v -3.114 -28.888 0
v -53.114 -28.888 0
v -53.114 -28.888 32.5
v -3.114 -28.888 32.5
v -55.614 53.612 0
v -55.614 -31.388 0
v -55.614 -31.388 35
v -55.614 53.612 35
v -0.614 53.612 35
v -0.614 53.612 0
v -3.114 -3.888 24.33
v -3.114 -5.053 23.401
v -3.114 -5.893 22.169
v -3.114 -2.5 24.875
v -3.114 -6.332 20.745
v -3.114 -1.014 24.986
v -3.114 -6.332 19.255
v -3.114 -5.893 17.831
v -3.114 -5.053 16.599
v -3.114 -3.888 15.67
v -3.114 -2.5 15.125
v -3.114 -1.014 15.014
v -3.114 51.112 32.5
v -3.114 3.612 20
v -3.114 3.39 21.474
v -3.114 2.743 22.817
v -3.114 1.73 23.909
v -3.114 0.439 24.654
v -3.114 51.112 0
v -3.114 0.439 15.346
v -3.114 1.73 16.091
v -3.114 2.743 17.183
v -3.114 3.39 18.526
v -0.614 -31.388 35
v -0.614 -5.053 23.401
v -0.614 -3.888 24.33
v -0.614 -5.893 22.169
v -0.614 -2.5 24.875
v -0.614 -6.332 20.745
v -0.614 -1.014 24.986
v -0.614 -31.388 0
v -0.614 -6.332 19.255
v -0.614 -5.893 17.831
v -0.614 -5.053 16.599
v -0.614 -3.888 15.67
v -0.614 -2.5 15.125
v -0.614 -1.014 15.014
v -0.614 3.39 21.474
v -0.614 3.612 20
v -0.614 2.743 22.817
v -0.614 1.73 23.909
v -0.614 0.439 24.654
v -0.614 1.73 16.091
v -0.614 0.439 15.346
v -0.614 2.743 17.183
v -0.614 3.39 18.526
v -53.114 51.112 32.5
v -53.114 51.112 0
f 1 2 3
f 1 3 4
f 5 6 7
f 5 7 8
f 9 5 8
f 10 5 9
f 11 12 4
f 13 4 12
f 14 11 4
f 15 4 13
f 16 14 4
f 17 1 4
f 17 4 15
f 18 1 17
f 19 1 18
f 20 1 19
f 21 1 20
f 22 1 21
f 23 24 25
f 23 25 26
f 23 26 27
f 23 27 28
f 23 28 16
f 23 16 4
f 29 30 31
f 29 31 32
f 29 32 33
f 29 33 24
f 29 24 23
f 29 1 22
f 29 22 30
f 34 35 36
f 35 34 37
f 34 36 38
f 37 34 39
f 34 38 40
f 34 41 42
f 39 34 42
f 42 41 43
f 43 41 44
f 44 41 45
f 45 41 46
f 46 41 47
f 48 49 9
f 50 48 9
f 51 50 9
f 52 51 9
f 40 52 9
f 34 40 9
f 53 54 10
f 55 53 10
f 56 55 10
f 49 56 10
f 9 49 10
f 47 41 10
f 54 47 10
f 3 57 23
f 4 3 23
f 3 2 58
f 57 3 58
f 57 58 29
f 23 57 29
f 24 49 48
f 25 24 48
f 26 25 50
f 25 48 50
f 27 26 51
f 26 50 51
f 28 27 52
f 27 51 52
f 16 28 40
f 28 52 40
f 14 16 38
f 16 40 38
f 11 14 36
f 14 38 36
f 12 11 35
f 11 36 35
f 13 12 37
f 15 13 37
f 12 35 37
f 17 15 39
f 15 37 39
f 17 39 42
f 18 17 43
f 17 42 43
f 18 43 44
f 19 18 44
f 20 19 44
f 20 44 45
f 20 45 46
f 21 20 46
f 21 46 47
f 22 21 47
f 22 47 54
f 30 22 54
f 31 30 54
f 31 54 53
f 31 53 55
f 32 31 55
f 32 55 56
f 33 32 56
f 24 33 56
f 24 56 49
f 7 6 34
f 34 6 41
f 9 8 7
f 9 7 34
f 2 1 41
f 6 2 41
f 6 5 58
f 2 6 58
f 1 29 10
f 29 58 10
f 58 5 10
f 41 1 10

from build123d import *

# Parameters (mm, degrees)
F0_W     = 55
F0_H     = 85
F1_DEPTH = 35
F3_T     = -2.5
F4_R     = 5
F5_DEPTH = 25


# Not quite as in the source:
# - the program builds the solid bodies; features that only make, move or delete a surface that nothing else refers to are left out


with BuildPart() as f1:
    # F0 (on Top) → F1 (new body)
    with BuildSketch(Plane.XY):
        with Locations((-28.1140384175, 11.1121237278)):
            Rectangle(F0_W, F0_H)
    extrude(amount=F1_DEPTH)

    # F3
    f3_openings = [f1.faces().sort_by_distance(p)[0] for p in [
        (-28.114038, 11.112124, 0),
    ]]
    offset(amount=F3_T, openings=f3_openings)

    # F4 (on face) → F5 (cut)
    with BuildSketch(Plane.YZ.offset(-0.6140384175)):
        with Locations((-1.3878762722, 20)):
            Circle(F4_R)
    extrude(amount=-F5_DEPTH, mode=Mode.SUBTRACT)


solid = f1.part
